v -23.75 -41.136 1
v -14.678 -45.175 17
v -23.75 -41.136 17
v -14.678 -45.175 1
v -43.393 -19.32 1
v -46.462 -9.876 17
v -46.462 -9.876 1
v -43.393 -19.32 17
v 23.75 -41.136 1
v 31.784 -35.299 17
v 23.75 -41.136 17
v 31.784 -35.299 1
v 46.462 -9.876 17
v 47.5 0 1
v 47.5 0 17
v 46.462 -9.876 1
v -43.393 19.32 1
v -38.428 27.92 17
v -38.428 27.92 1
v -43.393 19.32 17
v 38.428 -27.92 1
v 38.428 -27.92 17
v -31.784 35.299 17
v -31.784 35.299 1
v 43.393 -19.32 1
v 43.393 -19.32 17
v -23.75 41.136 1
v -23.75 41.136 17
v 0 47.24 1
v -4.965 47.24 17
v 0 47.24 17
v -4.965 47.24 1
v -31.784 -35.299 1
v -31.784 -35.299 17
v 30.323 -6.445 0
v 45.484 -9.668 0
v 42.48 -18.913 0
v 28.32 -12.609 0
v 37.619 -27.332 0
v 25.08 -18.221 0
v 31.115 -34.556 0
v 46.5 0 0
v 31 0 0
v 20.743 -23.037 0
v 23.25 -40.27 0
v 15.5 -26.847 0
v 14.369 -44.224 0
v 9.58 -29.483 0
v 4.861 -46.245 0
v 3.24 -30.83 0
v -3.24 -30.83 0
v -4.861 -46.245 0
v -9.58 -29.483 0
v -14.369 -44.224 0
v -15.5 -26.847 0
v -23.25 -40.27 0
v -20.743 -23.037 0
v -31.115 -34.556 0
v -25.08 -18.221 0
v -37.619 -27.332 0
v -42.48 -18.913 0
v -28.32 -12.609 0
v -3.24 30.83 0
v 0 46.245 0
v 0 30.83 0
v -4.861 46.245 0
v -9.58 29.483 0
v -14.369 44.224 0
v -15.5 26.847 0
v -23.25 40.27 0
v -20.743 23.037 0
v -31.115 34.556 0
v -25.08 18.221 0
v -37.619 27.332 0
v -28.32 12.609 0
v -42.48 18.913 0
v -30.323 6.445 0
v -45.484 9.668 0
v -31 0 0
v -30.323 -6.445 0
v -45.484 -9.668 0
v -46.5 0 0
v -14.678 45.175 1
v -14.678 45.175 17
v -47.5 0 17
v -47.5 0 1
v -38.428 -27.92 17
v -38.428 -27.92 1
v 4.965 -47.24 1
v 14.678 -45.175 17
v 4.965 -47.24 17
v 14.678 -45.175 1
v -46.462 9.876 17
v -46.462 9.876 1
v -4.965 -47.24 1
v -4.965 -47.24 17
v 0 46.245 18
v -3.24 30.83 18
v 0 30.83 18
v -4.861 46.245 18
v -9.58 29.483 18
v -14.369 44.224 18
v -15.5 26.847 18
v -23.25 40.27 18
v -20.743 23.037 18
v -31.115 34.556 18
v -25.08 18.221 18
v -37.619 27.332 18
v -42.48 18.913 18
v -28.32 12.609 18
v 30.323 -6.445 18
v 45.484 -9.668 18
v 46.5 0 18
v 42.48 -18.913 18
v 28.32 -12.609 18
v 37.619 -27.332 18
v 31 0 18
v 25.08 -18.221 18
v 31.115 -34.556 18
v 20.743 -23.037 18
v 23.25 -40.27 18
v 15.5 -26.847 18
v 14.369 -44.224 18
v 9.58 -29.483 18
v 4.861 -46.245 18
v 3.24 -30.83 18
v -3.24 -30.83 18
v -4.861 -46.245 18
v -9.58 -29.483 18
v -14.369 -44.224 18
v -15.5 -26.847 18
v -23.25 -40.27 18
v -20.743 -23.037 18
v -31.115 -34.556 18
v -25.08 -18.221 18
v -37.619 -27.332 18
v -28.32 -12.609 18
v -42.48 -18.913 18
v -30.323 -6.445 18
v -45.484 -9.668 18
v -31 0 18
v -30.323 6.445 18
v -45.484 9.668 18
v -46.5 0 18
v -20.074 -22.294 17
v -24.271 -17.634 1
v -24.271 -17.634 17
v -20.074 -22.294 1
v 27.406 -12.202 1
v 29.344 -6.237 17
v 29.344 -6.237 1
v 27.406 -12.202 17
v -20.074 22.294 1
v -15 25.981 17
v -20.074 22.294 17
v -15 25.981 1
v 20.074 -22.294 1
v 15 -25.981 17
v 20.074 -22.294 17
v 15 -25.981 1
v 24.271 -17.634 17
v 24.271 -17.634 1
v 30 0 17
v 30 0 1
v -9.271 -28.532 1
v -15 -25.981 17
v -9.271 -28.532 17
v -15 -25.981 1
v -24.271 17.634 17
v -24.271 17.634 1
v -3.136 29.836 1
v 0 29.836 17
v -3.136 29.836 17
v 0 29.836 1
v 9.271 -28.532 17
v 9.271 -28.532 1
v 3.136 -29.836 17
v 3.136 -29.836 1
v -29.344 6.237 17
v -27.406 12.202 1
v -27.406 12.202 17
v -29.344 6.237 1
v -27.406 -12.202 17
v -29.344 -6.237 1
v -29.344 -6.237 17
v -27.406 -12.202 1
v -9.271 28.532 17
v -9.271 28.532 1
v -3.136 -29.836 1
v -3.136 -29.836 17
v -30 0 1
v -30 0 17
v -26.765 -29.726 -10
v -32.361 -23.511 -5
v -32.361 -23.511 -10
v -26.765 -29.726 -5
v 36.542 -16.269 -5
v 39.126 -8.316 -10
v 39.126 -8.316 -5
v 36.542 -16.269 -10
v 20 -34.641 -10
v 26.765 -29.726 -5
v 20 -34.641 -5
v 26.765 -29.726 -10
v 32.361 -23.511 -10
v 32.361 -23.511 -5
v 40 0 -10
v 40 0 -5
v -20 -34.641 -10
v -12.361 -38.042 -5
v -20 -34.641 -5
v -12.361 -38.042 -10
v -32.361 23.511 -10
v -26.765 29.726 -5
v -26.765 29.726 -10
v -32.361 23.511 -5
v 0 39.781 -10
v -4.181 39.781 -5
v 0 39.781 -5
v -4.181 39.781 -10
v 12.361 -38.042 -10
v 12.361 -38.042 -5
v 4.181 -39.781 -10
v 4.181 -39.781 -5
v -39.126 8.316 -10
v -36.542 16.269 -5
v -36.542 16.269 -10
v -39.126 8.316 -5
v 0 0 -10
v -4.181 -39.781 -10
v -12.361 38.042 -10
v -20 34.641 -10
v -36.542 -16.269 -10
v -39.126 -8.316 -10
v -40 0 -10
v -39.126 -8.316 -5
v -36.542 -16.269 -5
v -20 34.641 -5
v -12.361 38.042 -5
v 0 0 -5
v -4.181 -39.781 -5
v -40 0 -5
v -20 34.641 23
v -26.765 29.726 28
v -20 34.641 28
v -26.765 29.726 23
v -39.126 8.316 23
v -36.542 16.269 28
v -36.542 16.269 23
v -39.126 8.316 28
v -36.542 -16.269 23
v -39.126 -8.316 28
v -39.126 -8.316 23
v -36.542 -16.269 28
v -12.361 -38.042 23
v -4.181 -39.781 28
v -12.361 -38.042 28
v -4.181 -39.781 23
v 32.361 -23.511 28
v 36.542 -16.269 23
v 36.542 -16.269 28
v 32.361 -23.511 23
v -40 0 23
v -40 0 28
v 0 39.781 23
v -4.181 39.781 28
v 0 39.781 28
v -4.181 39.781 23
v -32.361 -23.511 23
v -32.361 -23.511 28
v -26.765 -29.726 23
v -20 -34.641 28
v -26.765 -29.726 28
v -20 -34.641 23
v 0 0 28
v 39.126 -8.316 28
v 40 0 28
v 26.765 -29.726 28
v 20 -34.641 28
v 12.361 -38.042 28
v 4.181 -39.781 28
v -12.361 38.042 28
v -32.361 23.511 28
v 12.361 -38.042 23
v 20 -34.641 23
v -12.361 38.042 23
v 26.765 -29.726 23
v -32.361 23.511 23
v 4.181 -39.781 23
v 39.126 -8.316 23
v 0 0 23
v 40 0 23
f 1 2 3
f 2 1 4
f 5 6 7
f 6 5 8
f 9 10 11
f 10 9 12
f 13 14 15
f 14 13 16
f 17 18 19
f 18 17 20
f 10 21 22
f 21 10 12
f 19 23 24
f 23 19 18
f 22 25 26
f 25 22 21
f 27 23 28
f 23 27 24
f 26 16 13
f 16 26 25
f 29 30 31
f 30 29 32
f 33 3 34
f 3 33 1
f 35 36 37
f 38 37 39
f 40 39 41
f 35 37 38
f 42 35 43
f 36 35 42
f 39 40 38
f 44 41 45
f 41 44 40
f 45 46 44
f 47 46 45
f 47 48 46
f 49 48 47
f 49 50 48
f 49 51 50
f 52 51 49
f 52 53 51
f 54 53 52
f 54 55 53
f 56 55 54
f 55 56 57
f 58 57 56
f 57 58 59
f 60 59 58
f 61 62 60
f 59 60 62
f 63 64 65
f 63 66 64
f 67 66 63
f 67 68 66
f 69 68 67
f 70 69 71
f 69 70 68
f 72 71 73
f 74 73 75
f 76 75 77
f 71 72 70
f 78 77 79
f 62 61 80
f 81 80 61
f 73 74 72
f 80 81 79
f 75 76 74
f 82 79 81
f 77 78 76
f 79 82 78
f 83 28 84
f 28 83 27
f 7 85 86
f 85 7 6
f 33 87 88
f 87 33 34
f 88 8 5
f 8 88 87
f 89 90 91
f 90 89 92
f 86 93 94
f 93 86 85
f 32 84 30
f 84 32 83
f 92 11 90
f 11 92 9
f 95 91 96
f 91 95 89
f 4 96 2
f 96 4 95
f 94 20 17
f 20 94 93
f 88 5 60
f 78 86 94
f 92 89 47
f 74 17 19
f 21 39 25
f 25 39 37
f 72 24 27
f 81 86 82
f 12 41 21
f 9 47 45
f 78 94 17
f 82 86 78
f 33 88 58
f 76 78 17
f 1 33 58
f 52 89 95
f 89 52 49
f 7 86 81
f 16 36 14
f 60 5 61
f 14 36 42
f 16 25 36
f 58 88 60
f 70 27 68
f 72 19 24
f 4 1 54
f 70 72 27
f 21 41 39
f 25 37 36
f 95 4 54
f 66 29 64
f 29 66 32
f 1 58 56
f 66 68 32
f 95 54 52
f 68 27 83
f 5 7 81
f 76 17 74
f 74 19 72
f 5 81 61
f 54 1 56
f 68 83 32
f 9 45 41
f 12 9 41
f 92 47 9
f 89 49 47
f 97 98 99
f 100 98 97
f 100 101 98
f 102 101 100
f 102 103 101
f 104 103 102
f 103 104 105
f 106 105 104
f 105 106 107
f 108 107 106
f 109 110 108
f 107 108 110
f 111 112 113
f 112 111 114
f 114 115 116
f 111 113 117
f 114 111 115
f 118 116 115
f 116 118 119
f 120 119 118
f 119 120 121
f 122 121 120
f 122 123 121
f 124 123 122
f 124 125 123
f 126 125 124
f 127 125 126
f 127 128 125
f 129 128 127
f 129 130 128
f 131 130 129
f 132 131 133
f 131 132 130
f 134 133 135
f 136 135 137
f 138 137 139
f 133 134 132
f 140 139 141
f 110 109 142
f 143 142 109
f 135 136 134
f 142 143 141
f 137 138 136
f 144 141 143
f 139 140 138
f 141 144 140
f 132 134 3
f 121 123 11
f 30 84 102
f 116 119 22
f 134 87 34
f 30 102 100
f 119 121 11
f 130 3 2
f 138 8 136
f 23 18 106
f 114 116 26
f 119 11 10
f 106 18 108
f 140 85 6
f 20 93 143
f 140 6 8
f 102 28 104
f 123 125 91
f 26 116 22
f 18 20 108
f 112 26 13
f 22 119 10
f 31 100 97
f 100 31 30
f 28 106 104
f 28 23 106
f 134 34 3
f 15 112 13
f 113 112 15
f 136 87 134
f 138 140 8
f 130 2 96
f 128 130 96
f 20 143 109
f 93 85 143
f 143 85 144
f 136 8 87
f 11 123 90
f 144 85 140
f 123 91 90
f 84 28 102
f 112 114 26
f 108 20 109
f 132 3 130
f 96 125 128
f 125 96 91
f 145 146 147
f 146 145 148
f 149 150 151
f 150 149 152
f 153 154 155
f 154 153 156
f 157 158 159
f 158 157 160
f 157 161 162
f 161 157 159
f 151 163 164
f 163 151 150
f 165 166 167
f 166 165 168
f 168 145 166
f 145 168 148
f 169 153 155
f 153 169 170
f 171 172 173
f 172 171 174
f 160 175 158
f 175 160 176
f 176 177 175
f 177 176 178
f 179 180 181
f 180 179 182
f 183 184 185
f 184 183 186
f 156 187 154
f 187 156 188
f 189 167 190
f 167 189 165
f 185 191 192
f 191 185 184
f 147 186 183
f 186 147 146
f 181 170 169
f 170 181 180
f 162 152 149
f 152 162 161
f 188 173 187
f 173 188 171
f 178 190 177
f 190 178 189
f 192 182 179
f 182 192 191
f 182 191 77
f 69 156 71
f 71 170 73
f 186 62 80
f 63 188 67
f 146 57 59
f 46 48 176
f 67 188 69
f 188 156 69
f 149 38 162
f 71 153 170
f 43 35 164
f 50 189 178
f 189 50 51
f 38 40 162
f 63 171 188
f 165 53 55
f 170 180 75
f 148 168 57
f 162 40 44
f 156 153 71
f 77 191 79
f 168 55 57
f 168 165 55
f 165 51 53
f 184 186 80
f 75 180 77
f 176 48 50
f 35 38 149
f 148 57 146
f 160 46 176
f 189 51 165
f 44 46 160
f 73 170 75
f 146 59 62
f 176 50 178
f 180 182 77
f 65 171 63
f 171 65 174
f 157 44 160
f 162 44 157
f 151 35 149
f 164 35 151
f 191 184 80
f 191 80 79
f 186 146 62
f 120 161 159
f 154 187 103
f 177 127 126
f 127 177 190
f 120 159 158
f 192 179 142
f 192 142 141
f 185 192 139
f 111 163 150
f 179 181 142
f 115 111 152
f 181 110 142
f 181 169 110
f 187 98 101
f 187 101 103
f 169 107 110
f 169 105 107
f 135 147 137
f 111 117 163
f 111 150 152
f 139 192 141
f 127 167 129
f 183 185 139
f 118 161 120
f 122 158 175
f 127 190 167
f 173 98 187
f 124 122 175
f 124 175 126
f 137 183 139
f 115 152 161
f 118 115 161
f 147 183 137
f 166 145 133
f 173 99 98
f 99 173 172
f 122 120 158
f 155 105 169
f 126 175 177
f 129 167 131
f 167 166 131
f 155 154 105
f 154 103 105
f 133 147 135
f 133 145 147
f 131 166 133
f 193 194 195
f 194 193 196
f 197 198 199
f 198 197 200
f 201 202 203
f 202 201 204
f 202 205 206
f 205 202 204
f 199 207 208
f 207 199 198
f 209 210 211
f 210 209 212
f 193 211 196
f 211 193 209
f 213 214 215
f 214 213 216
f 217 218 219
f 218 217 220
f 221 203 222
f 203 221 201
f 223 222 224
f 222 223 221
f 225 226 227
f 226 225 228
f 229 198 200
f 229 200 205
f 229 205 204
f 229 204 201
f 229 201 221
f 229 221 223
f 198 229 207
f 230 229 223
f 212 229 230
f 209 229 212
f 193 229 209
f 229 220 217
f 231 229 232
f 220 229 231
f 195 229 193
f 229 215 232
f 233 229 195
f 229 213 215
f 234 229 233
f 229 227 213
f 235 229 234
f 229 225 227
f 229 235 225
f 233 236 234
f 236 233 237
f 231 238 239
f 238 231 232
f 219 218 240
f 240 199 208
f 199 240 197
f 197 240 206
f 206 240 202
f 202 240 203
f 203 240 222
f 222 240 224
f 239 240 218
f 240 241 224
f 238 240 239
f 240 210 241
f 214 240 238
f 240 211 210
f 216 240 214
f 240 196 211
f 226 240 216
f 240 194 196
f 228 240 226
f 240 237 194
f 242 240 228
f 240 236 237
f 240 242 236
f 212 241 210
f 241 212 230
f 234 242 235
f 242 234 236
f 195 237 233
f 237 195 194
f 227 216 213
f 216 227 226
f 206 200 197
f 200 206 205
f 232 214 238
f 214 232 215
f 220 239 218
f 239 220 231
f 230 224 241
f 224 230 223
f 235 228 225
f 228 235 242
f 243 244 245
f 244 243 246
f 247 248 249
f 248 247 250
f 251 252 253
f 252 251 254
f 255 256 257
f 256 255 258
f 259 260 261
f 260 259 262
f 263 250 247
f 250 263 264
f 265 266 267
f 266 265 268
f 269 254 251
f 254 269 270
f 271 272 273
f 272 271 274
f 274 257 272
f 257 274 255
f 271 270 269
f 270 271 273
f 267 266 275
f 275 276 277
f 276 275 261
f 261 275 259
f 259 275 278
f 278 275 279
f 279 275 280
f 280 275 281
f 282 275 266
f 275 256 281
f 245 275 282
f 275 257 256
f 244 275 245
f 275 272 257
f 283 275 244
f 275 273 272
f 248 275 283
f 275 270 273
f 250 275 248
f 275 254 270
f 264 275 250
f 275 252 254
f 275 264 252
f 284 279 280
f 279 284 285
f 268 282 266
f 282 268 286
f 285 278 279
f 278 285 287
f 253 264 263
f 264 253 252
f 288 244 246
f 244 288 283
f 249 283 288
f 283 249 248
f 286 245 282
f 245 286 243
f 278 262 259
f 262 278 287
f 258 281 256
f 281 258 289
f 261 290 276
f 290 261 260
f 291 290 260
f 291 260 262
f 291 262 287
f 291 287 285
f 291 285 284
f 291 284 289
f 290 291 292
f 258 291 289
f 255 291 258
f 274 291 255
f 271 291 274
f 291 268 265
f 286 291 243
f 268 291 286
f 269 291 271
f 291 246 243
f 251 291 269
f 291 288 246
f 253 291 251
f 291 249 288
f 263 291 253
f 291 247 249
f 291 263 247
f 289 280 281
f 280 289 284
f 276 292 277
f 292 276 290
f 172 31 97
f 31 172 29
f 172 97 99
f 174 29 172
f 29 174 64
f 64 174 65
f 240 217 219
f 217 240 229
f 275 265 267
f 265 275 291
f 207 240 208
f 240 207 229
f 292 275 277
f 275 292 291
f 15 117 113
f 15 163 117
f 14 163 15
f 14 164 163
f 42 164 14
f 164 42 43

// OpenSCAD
/* Harmonic Drive NG by Tomi T. Salo <ttsalo@iki.fi> 2013 */

/* New Generation Harmonic Drive. 

   Design principles: 
   - Two relatively closely spaced round flanges, which rotate relative to each other
   - Flanges connect to the inner and outer rims of a large diameter bearing, offering
     good stability.
   - The flexspline fits inside the bearing, making the whole assembly compact.
   - The flexspline flange's outside surface is smooth, allowing mounting to a solid surface, 
     if necessary, and all the drive parts can be disassembled from the circspline side while 
     both flanges and the main bearing remain attached to the main application.
*/

/* Prototype notes:
   6012 bearing, size 60x95x18

*/   

tol = 0.25;

/* 6012 size bearing */
bearing_inner_r = 60/2;
bearing_outer_r = 95/2;
bearing_h = 18;
bearing_cone_l = 1; // Length of the bearing conical section 

flange_r = 40;
flange_h = 5;

flex_flange_r = flange_r;
flex_flange_h = flange_h;
flex_flange_sep = 5; // Distance from bearing to flange
flex_inner_t = 3; // Outer side thickness of the bearing support
flex_below_hook = 3;
flex_above_hook = 3;
flex_above_h = 3;
flex_base_t = 8;
flex_lockring_h = 2;
flex_lockring_t = 2;

circ_flange_r = flange_r;
circ_flange_h = flange_h;
circ_flange_sep = 5; // Distance from bearing to flange
circ_outer_t = 3; // Outer side thickness of the bearing support
circ_below_hook = 3;
circ_above_hook = 3;
circ_above_h = 3;
circ_base_t = 8;
circ_lockring_h = 2;
circ_lockring_t = 2;

module bearing() {
  color("blue")
  difference() {
    cylinder(r=bearing_outer_r, h=bearing_h);
    translate([0, 0, -1]) cylinder(r=bearing_inner_r, h=bearing_h+2);
    cylinder(r1=bearing_inner_r+bearing_cone_l, r2=bearing_inner_r, h=bearing_cone_l);
    translate([0, 0, bearing_h-bearing_cone_l])
      cylinder(r1=bearing_inner_r, r2=bearing_inner_r+bearing_cone_l, h=bearing_cone_l);
    difference() {
      cylinder(r=bearing_outer_r, h=bearing_cone_l);
      cylinder(r1=bearing_outer_r-bearing_cone_l, r2=bearing_outer_r, h=bearing_cone_l);
    }
    translate([0, 0, bearing_h-bearing_cone_l])
      difference() {
        cylinder(r=bearing_outer_r, h=bearing_cone_l);
        cylinder(r1=bearing_outer_r, r2=bearing_outer_r-bearing_cone_l, h=bearing_cone_l);
      }
  }
}

/* Flex and circ flange Z=0 is at the outer surface of the flange, with positive Z towards
   the flange. */

module flex_flange() {
    cylinder(r=flex_flange_r, h=flex_flange_h);
}

module circ_flange() {
    cylinder(r=circ_flange_r, h=circ_flange_h);
}

difference() {
  union() {
    bearing();
    translate([0, 0, -flex_flange_h-flex_flange_sep])
      flex_flange();
    translate([0, 0, bearing_h+circ_flange_sep+circ_flange_h])
      mirror([0, 0, -1]) circ_flange();
  }
  translate([0, 0, -50]) cube([100, 100, 100]);
}
